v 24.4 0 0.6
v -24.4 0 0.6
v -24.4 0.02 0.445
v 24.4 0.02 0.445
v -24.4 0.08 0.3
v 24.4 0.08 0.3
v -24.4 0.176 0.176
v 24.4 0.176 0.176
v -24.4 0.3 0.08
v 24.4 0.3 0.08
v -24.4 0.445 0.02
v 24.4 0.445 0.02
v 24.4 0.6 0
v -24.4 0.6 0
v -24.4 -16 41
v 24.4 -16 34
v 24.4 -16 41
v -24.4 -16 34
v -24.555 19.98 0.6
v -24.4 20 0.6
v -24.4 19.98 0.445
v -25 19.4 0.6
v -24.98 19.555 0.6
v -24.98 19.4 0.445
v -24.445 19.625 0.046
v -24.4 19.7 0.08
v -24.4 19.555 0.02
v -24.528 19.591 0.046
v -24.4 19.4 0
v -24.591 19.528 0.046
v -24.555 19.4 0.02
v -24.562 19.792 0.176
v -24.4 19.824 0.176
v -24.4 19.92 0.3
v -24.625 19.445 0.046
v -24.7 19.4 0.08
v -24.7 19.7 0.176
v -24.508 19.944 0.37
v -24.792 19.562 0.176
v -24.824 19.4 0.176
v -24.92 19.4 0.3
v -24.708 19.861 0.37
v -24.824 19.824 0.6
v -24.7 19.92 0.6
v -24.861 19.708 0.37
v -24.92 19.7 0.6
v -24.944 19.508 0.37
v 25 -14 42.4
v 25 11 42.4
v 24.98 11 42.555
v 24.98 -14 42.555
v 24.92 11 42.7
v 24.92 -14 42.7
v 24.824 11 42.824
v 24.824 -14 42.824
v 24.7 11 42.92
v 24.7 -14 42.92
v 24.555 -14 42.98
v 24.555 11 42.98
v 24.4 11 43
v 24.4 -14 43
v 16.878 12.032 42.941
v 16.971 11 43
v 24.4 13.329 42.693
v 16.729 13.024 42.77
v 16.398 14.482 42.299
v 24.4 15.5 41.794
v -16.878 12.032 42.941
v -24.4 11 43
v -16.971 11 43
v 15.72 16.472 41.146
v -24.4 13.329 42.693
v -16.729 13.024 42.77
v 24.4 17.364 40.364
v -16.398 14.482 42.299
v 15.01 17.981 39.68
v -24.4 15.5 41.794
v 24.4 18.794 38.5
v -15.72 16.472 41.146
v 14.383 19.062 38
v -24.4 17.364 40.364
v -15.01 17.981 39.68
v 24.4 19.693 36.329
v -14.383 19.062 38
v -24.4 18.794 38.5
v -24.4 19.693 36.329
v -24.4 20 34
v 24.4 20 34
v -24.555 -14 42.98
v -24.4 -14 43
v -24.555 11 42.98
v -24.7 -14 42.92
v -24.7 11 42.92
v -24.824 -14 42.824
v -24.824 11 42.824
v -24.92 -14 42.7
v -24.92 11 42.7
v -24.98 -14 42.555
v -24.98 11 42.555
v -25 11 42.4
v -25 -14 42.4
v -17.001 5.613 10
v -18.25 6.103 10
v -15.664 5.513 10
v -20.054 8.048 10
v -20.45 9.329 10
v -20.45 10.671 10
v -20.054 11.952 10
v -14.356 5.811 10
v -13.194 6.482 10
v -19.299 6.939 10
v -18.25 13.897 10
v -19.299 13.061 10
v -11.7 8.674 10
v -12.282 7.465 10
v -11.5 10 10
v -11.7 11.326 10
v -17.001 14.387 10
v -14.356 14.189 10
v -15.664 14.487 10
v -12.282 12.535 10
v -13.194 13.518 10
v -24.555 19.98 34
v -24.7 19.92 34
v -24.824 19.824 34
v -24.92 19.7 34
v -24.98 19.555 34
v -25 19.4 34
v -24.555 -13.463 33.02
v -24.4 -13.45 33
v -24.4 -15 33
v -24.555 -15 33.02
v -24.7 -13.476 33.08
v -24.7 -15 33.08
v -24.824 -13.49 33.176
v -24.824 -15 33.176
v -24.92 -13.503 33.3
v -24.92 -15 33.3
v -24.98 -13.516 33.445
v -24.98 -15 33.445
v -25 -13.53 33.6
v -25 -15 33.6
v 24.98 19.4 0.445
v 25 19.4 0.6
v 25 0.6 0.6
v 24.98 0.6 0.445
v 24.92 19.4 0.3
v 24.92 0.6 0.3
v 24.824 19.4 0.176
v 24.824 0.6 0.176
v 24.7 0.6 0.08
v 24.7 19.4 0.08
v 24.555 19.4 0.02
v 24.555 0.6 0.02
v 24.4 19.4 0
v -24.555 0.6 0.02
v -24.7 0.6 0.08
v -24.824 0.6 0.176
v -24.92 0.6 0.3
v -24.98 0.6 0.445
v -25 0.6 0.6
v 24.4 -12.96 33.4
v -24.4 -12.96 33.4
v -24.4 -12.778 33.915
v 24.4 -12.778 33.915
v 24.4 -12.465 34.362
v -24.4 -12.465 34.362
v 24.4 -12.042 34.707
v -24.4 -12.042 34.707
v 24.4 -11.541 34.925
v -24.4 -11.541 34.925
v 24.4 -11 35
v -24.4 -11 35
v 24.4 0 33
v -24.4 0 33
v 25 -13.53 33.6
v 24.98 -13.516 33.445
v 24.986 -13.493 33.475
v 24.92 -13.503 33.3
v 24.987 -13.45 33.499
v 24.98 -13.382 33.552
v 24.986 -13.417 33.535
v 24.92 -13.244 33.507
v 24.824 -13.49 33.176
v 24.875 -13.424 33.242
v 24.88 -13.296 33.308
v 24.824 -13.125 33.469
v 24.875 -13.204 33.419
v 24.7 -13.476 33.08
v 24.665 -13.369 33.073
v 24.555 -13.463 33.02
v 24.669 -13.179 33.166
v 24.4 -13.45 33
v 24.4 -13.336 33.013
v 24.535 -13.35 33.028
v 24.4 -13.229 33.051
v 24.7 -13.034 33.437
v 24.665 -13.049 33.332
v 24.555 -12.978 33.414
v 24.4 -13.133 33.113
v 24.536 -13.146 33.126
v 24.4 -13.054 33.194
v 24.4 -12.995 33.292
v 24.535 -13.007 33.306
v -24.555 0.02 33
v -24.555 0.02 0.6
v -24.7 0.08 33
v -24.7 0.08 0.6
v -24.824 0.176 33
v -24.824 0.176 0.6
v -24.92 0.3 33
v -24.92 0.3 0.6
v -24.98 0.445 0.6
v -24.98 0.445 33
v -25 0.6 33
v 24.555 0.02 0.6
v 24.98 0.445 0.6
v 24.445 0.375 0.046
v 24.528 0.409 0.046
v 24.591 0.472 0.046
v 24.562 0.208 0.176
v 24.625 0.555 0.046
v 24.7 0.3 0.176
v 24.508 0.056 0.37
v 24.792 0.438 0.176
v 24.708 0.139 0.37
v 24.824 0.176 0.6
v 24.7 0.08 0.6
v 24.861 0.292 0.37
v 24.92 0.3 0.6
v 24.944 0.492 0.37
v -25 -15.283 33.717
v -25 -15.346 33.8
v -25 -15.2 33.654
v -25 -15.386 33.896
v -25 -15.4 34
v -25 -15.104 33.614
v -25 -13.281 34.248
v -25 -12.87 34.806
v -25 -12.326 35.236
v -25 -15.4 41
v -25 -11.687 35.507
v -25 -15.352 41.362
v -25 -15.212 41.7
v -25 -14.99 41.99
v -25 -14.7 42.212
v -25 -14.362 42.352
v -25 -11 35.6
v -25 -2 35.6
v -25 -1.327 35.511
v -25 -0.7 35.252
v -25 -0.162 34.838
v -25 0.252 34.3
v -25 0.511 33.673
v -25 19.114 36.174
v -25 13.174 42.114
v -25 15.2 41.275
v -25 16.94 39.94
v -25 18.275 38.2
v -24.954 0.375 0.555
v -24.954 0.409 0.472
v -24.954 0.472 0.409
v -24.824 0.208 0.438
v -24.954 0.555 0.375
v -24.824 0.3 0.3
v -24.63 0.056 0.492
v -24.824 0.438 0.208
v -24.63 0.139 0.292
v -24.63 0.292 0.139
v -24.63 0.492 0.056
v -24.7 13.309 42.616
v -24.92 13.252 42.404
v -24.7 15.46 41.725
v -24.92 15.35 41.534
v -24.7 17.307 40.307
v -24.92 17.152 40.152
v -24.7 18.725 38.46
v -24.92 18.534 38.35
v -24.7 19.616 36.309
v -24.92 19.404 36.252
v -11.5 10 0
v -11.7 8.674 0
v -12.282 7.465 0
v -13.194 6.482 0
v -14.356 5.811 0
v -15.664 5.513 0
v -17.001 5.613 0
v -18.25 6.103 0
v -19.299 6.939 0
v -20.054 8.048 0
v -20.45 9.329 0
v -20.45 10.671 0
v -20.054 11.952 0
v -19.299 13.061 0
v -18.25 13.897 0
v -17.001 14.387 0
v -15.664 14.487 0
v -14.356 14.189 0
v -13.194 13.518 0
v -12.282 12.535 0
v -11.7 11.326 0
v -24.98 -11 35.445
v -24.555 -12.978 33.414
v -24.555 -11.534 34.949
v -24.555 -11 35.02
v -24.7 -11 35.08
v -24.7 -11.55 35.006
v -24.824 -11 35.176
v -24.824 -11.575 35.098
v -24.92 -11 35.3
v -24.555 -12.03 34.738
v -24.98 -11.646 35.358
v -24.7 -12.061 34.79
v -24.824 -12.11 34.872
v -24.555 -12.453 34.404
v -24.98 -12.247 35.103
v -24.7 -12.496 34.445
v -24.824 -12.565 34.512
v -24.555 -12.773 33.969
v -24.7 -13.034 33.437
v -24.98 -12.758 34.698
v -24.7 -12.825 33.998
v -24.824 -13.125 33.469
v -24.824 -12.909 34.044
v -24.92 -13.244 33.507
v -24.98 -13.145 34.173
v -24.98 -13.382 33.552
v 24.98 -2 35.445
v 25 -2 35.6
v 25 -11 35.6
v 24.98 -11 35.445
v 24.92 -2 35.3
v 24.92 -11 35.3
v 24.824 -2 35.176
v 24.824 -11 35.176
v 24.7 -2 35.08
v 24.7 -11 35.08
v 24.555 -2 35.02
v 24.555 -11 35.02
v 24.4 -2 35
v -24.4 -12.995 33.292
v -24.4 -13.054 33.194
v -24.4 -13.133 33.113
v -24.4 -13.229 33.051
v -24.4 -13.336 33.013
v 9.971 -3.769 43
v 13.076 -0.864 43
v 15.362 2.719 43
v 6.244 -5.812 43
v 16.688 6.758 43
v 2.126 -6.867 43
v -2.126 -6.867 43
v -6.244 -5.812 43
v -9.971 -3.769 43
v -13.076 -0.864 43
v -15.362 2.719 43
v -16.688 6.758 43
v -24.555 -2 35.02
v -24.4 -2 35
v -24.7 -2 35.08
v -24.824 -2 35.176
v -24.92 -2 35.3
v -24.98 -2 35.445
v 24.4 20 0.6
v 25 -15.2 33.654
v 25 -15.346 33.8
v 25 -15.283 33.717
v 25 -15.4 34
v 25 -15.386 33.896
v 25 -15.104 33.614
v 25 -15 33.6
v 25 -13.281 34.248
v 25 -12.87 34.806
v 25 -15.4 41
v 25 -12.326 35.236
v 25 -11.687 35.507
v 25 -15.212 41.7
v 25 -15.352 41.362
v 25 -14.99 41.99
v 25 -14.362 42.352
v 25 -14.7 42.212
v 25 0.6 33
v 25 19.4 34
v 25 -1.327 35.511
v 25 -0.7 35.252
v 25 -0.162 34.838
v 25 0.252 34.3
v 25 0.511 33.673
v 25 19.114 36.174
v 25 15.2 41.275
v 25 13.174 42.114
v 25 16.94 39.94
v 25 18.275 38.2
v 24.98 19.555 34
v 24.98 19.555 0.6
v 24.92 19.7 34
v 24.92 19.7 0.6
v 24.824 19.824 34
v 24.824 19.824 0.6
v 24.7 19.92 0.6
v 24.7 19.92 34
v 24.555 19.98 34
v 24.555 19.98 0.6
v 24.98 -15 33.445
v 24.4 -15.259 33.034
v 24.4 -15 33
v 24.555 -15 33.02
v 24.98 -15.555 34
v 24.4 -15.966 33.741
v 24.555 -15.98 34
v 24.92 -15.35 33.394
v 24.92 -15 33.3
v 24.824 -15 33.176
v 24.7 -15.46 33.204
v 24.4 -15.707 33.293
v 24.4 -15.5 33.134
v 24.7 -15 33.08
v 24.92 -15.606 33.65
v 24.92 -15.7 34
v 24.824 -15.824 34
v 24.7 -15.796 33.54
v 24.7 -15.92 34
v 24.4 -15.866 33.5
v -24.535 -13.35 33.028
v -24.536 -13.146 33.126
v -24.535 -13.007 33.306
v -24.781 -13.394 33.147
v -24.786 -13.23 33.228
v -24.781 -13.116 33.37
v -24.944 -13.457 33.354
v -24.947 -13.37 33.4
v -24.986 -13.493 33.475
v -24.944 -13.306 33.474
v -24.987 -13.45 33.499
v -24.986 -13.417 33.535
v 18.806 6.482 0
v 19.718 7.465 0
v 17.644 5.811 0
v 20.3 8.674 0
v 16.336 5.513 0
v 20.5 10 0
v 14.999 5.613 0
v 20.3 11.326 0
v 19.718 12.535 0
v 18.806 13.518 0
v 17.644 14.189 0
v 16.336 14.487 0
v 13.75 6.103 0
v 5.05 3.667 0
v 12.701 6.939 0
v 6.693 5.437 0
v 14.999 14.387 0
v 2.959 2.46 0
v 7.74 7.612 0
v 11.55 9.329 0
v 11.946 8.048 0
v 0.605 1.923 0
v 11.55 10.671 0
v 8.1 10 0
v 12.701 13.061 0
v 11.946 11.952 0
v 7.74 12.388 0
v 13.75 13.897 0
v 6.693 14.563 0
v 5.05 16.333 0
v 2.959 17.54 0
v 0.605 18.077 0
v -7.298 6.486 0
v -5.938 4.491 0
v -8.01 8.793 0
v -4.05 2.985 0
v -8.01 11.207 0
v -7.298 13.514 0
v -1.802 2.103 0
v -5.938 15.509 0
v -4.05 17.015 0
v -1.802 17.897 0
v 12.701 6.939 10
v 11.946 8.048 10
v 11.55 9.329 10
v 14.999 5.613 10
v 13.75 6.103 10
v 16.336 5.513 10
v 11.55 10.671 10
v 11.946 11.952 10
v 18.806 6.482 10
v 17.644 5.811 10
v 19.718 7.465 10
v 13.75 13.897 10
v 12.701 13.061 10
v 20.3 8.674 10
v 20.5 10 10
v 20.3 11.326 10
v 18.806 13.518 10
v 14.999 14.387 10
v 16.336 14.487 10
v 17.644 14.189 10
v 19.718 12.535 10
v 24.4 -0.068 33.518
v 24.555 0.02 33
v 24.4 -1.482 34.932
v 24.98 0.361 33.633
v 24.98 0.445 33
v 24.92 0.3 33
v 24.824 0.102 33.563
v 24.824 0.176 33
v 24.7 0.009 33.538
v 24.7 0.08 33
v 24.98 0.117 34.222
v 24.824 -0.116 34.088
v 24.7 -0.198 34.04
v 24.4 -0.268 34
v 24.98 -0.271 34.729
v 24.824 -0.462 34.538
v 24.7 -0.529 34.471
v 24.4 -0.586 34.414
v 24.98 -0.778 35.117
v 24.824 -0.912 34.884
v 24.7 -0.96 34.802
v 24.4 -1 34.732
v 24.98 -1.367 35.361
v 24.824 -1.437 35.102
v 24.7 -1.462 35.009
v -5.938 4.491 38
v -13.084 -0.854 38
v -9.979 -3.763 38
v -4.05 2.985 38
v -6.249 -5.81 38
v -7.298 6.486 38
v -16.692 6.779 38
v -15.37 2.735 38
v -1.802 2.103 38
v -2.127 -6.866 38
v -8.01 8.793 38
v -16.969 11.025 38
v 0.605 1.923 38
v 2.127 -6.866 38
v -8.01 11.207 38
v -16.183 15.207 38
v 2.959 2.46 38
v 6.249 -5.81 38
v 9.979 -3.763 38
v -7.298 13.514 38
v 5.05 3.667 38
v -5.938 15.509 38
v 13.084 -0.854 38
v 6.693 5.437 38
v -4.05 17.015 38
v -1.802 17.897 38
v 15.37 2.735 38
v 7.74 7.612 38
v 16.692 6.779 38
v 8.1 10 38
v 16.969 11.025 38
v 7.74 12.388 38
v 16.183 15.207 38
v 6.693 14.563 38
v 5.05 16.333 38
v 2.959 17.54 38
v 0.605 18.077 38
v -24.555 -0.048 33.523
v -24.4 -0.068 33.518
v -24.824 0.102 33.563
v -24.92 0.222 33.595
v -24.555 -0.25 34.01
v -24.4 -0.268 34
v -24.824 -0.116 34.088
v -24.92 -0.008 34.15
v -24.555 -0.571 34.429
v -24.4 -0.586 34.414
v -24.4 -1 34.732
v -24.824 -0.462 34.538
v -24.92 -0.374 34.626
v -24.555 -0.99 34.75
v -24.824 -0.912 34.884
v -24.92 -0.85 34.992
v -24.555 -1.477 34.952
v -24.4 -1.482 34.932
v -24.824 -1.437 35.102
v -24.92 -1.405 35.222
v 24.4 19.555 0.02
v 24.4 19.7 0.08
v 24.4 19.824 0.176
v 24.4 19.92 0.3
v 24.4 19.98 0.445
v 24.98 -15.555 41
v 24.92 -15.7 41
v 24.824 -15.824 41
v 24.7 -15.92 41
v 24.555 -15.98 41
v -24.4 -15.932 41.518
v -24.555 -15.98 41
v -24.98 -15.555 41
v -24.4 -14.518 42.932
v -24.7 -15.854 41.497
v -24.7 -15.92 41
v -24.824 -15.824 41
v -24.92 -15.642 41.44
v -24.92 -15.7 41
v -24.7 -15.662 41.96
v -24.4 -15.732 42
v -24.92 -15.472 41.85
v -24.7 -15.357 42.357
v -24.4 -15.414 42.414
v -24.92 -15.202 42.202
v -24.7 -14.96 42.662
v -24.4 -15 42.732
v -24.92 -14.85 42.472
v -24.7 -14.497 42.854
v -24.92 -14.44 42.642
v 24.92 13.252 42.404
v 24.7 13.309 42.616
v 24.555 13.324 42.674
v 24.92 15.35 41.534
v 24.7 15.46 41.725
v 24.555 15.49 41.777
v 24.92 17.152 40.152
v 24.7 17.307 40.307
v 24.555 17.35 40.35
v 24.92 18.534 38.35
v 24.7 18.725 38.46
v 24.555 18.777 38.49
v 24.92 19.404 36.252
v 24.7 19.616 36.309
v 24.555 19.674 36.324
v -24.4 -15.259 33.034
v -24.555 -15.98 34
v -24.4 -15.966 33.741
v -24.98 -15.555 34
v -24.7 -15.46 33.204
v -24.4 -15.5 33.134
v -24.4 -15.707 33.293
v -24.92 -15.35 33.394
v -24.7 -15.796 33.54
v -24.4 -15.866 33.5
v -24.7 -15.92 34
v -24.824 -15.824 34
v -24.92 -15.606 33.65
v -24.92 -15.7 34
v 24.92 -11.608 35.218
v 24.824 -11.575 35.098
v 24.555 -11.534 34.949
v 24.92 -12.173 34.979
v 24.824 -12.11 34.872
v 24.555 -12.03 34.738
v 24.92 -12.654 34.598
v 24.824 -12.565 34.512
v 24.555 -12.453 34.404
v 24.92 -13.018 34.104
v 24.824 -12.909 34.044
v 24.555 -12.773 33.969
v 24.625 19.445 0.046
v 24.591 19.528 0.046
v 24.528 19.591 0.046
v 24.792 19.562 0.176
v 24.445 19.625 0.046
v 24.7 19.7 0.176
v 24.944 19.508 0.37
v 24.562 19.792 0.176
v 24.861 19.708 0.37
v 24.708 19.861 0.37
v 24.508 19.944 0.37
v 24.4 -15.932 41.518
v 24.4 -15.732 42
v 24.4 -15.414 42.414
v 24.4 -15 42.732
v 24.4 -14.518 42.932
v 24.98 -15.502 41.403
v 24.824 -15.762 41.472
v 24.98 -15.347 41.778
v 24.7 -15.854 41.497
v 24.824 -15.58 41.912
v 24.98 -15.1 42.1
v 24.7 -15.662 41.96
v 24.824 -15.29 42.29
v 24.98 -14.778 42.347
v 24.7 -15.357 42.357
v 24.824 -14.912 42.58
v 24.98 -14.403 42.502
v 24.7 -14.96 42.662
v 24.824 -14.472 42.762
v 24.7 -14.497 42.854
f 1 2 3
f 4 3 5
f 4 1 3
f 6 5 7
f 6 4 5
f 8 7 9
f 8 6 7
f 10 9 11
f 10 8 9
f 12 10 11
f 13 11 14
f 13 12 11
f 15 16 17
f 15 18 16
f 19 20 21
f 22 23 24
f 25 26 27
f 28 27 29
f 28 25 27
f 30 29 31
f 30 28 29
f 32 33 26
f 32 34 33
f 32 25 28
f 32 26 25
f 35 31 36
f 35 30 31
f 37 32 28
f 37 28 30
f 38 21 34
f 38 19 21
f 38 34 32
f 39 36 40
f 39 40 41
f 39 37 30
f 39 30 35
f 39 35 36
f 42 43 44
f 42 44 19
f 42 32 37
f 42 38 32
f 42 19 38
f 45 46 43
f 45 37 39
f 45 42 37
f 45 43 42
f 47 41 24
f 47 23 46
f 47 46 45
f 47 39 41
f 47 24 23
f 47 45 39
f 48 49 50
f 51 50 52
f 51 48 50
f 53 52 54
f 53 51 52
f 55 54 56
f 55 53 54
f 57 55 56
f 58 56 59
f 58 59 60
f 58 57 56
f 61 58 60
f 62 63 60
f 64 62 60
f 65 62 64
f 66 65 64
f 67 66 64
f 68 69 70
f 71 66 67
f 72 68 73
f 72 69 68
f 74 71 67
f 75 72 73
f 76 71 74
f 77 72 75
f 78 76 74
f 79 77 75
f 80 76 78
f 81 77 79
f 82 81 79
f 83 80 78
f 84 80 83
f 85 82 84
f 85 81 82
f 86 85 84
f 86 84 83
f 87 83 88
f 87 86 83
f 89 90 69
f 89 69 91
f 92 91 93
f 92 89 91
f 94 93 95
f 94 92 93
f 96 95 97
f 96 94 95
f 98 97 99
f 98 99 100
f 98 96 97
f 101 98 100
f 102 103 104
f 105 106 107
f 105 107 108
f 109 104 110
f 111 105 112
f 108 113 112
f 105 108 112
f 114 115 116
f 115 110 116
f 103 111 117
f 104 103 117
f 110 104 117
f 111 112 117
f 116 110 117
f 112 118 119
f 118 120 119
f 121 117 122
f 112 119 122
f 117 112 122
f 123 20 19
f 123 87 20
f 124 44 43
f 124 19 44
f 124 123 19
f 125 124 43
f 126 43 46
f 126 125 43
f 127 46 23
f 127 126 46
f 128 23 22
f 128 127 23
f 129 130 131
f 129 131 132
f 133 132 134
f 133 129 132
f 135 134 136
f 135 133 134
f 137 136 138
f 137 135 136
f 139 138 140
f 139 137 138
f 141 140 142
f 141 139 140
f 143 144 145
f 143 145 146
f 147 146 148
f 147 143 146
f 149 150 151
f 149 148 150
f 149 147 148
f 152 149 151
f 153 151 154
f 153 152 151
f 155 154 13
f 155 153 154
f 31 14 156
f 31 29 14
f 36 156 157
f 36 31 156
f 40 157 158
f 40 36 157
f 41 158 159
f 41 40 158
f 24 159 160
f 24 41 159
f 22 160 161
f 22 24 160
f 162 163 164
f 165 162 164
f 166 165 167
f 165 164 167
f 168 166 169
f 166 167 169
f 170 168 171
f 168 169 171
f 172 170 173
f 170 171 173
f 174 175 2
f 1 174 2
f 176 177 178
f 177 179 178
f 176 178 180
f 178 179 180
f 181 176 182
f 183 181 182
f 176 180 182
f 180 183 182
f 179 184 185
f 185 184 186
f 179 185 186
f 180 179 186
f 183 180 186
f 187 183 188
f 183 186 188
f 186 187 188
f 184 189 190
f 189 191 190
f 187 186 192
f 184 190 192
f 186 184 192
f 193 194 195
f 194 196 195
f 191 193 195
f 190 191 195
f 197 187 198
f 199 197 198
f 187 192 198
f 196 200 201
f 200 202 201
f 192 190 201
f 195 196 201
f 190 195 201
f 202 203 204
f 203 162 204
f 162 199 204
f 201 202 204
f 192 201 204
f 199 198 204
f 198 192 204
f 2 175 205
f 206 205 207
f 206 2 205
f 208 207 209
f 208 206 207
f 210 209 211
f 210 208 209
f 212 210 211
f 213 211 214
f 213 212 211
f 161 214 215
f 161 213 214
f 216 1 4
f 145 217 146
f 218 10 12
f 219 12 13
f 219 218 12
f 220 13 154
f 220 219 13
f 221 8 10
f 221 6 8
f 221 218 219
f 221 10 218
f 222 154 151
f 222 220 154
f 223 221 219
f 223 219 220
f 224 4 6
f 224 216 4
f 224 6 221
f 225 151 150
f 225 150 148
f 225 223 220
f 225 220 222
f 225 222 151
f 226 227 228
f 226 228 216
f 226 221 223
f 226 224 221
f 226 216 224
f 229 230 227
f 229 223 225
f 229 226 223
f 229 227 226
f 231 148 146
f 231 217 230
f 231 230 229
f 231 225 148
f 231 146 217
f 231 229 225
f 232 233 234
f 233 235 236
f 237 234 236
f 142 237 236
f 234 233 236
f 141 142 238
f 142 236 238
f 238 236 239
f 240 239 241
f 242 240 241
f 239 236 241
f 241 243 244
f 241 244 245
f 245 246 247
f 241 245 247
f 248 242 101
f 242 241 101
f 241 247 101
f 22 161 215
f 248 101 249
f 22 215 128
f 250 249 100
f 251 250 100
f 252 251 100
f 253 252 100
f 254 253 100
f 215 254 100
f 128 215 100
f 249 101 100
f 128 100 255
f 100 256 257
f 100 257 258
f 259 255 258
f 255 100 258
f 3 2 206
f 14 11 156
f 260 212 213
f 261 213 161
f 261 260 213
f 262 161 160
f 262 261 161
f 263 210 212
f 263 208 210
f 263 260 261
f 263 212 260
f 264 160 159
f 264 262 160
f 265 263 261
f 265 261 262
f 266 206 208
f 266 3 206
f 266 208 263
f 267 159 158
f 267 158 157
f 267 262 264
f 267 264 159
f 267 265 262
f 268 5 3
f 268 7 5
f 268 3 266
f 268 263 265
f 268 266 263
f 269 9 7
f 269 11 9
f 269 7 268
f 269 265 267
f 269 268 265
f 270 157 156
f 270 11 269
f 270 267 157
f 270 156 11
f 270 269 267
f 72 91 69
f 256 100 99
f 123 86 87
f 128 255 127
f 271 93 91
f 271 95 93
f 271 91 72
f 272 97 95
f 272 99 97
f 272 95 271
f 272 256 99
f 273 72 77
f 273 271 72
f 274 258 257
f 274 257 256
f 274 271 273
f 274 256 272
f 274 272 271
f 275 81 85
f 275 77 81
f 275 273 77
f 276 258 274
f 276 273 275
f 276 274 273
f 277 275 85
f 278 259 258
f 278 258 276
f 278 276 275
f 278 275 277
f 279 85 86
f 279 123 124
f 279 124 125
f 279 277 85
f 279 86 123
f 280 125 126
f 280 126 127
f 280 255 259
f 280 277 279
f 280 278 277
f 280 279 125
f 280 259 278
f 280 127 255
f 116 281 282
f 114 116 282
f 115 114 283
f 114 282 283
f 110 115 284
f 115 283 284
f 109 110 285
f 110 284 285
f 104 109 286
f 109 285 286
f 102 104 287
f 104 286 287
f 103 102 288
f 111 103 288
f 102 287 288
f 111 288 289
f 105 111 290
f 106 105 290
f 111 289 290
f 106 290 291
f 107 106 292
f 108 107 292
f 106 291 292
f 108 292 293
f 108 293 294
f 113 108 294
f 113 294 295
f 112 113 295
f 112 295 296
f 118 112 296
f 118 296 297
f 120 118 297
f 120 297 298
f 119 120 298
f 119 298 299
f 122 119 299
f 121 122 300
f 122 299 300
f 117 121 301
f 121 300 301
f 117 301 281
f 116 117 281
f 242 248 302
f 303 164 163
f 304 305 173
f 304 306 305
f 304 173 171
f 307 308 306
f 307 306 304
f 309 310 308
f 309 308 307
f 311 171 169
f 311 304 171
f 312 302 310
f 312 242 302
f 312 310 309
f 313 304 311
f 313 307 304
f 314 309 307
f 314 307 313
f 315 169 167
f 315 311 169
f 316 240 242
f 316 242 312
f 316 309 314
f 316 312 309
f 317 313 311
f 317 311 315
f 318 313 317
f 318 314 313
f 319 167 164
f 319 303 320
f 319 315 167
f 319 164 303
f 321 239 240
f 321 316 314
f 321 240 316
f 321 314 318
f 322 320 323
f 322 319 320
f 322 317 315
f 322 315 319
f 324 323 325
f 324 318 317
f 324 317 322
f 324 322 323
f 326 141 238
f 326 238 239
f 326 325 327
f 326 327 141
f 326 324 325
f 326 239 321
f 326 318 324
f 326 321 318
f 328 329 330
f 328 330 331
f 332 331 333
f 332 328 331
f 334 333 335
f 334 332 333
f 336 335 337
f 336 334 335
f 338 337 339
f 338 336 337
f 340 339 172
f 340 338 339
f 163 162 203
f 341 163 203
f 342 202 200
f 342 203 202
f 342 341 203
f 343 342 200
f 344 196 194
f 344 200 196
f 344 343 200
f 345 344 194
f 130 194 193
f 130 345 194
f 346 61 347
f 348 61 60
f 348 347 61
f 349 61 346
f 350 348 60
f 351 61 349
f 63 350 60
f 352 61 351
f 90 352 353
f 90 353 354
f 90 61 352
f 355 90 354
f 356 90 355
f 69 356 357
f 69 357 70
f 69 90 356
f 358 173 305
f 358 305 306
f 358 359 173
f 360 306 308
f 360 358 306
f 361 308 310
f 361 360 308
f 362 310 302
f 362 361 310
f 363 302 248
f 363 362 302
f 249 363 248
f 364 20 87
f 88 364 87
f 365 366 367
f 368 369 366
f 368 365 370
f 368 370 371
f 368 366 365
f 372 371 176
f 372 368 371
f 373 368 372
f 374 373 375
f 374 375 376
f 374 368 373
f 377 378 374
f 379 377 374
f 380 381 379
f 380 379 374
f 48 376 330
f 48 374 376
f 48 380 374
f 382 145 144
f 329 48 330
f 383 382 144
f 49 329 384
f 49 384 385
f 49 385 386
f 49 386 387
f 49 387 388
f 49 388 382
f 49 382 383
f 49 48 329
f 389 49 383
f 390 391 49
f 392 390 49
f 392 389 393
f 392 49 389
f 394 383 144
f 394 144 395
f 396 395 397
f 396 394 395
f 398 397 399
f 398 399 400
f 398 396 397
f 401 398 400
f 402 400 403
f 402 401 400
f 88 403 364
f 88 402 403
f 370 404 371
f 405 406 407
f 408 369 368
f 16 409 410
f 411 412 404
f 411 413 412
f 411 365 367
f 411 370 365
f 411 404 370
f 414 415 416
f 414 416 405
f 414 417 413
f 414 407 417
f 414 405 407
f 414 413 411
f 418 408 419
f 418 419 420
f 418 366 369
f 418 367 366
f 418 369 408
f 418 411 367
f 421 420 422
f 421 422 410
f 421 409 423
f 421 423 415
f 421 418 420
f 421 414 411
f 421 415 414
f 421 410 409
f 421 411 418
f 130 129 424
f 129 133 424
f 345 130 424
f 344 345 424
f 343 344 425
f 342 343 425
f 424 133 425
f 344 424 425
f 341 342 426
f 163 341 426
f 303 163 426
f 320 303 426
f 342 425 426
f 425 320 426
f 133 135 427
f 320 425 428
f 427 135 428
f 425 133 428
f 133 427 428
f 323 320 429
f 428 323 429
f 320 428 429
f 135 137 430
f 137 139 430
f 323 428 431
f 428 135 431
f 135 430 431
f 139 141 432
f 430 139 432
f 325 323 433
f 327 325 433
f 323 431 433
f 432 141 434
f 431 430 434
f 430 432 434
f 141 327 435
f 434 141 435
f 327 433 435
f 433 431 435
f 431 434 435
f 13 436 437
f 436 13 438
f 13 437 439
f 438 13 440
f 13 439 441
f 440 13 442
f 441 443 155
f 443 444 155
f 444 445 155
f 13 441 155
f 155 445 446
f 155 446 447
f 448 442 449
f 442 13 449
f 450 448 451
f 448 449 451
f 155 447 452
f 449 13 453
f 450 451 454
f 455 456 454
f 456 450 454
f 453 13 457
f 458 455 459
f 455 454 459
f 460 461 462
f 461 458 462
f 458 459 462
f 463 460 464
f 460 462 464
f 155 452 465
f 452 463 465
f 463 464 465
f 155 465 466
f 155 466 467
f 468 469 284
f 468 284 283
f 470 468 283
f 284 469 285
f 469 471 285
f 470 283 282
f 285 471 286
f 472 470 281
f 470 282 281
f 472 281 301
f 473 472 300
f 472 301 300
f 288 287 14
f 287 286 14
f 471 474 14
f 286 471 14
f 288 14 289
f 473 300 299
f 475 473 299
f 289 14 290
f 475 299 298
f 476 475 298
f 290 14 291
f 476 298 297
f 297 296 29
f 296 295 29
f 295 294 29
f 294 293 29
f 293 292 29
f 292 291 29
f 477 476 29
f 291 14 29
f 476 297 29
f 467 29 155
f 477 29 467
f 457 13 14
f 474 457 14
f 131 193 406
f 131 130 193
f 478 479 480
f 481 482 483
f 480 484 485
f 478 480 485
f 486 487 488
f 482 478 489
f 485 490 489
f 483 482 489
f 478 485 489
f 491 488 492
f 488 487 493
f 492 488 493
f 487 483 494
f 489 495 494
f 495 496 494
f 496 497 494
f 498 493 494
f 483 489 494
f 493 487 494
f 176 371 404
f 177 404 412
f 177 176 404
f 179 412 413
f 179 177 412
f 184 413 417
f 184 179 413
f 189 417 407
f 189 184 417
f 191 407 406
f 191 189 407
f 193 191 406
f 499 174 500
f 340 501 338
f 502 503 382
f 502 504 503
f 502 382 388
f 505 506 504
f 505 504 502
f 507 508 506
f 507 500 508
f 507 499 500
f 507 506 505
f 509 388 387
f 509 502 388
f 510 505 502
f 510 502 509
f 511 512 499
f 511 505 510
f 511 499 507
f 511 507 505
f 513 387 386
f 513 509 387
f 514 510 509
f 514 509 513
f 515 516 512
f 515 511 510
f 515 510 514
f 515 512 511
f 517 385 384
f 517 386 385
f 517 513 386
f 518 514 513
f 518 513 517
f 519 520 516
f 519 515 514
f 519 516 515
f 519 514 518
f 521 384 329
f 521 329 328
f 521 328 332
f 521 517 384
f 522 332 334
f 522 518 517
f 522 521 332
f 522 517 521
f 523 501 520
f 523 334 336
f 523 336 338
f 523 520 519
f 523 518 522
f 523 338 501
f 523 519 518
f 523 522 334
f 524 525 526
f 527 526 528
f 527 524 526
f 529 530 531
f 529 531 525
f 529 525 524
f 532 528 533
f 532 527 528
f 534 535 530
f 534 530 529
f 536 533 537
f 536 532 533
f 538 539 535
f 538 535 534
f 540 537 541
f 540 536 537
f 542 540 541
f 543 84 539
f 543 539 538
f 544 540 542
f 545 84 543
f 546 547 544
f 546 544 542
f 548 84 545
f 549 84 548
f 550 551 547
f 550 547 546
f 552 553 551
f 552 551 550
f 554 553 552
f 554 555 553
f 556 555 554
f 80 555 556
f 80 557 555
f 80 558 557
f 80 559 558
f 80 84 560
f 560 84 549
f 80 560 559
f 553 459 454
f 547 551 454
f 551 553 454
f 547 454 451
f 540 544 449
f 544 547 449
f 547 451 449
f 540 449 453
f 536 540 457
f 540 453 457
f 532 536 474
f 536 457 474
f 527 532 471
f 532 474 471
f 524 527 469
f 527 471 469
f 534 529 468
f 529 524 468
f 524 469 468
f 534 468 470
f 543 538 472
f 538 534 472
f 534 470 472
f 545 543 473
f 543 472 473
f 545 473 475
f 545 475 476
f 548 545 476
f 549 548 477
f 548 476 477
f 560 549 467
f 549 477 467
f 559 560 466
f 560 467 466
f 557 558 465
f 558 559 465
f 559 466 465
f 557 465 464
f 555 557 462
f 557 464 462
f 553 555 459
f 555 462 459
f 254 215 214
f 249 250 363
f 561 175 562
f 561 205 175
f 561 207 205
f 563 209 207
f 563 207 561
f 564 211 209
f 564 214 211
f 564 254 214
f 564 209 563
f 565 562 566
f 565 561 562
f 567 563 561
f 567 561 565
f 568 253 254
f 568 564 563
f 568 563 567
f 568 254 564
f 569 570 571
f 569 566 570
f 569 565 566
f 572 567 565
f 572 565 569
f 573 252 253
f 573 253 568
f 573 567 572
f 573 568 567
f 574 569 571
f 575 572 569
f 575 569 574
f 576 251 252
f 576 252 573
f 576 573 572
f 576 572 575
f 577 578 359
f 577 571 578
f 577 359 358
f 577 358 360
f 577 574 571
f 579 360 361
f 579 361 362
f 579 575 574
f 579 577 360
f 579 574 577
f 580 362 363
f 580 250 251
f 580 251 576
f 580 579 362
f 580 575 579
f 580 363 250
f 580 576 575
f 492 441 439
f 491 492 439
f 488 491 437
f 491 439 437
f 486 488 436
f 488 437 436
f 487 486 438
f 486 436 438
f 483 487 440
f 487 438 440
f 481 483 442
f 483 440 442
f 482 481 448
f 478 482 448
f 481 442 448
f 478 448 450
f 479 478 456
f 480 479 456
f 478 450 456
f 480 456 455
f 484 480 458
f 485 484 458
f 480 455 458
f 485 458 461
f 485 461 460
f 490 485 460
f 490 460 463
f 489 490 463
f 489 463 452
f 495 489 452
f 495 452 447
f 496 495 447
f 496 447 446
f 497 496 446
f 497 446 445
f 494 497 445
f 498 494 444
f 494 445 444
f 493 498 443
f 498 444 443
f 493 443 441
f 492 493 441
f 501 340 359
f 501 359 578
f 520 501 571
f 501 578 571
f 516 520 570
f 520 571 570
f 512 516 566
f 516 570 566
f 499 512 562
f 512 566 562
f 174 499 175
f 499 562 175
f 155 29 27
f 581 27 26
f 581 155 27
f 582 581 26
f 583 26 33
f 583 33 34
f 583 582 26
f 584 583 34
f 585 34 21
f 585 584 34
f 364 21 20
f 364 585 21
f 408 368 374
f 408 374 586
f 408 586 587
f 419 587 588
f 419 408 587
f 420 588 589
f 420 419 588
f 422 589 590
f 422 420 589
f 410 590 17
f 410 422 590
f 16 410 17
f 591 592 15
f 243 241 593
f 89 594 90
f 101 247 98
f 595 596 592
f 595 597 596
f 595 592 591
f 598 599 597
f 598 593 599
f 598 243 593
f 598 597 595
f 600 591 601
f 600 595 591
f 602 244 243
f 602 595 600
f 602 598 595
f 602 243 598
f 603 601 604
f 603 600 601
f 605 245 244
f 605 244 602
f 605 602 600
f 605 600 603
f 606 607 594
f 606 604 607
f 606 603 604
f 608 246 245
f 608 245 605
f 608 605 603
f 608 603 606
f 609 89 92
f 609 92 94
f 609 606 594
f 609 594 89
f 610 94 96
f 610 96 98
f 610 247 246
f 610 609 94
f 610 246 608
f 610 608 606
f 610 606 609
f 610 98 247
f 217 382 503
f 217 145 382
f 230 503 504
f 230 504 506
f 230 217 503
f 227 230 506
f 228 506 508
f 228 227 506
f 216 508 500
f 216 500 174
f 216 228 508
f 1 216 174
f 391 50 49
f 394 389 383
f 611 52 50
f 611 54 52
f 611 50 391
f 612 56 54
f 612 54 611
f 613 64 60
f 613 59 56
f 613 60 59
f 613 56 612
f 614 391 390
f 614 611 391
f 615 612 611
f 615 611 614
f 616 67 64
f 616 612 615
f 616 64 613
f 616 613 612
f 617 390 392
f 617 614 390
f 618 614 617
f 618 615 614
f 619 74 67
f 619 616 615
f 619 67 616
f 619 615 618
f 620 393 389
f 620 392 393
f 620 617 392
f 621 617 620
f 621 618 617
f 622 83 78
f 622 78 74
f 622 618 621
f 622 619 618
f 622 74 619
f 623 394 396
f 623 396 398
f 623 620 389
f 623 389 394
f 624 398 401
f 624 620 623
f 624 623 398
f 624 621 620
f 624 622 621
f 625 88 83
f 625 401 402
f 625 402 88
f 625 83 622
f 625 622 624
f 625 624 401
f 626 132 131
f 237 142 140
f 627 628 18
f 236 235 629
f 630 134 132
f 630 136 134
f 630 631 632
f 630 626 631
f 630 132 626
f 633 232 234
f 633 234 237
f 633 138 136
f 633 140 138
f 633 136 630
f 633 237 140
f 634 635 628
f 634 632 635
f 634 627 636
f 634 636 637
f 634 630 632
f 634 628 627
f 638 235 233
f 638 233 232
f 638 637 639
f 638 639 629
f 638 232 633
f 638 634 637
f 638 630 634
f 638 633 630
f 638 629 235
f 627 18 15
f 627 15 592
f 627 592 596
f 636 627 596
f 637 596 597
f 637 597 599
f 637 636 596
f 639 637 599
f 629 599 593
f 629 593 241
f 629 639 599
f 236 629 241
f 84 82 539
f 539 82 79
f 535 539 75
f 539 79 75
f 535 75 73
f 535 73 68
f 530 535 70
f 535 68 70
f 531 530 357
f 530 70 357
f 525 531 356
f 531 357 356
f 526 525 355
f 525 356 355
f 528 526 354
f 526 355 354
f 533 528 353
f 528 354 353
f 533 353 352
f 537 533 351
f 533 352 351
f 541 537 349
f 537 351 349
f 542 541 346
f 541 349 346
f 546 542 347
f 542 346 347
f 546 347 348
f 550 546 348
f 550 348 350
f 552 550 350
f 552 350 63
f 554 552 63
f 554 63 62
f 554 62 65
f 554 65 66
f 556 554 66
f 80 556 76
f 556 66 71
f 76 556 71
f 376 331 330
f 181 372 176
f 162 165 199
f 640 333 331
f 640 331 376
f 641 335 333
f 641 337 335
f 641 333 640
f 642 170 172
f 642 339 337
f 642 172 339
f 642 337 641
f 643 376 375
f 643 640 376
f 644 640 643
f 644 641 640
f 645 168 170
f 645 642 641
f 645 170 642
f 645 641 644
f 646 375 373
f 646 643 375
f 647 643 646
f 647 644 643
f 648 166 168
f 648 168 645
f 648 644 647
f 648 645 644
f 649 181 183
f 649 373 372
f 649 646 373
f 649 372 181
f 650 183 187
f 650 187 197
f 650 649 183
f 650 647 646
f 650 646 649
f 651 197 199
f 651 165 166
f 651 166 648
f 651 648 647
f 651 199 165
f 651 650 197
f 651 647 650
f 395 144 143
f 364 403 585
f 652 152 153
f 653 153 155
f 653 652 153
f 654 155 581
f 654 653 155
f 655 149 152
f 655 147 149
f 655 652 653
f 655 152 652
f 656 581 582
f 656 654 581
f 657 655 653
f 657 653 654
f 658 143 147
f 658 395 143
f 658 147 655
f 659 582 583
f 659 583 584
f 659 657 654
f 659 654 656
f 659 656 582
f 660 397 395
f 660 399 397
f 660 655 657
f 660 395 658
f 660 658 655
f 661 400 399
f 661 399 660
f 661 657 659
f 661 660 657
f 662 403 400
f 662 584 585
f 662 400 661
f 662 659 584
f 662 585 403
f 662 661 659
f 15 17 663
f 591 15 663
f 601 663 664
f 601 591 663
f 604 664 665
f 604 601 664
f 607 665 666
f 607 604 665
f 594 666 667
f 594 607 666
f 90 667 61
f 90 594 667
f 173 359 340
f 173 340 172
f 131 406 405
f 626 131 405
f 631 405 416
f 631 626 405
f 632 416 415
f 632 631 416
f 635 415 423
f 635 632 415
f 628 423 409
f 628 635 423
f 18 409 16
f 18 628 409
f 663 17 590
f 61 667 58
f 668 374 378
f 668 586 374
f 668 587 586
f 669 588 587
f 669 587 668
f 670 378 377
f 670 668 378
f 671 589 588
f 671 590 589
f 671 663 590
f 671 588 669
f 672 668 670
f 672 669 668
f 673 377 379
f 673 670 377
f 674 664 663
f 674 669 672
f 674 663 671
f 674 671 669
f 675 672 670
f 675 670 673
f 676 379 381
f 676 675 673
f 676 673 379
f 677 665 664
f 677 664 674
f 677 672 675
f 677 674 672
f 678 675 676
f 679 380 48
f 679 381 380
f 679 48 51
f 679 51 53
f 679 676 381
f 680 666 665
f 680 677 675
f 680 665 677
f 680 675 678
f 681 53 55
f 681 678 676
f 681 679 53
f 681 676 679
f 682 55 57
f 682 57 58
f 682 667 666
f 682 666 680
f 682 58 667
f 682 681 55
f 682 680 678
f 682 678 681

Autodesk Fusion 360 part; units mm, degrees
sketch "PhoneSupportTop" plane through (0, 0, 0) normal (1, 0, 0) x (0, 1, 0)
  line L0 (0, 0) -> (20, 0)
  line L1 (0, 33) -> (0, 0)
  line L2 (-2, 35) -> (-11, 35)
  line L3 (-13.4495, 33) -> (-15, 33)
  line L4 (-16, 34) -> (-16, 41)
  arc A0 (-11, 35) -> (-12.9596, 33.4) centre (-11, 33) ccw
  arc A1 (0, 33) -> (-2, 35) centre (-2, 33) ccw
  line L5 (-14, 43) -> (11, 43)
  line L6 (20, 0) -> (20, 34)
  arc A2 (20, 34) -> (11, 43) centre (11, 34) ccw
  arc A3 (-14, 43) -> (-16, 41) centre (-14, 41) ccw
  arc A4 (-13.4495, 33) -> (-12.9596, 33.4) centre (-13.4495, 33.5) ccw
  arc A5 (-16, 34) -> (-15, 33) centre (-15, 34) ccw
  point P0 (-13, 33)
  point P1 (-16, 33)
  point P2 (-16, 43)
  dimension "d3" = 20
  dimension "d7" = 4
  dimension "d8" = 3
  dimension "d10" = 2
  dimension "d11" = 9
  dimension "d13" = 34
  dimension "d14" = 27
  dimension "d15" = 10
  dimension "d16" = 9
  dimension "d17" = 2
  dimension "d18" = 0.5
  dimension "d19" = 1
extrude "Extrude1" add sketch "PhoneSupportTop" along normal mid plane 50
sketch "Sketch2" plane through (0, 0, 0) normal (0, 0, 1) x (1, 0, 0)
  line L0 (25, 20) -> (-25, 20) construction
  line L1 (-25, 20) -> (-25, 0) construction
  line L2 (-25, 0) -> (25, 0) construction
  line L3 (25, 0) -> (25, 20) construction
  line L4 (25, 10) -> (-25, 10) construction
  circle A0 centre (0, 10) radius 8.1
  circle A1 centre (16, 10) radius 4.5
  circle A2 centre (-16, 10) radius 4.5
  circle A3 centre (0, 10) radius 17
  dimension "d23" = 16.2
  dimension "d24" = 9
  dimension "d25" = 9
  dimension "d27" = 9
  dimension "d28" = 9
  dimension "d40" = 34
extrude "Extrude2" cut sketch "Sketch2" along normal blind 10 contours A1 A3 | A1 A3 | A2 A3 | A2 A3
extrude "Extrude3" cut sketch "Sketch2" along normal through all contours A0
extrude "Extrude4" cut sketch "Sketch2" against normal blind 5 from surface at 43 contours A1 A2 A3
fillet "Fillet1" radius 0.6 28 edges at (25, 20, 17) (25, 17.364, 40.364) (25, -1.5, 43) (25, -15.4142, 42.4142) (25, -16, 37.5) (25, -15.7071, 33.2929) (25, -14.2247, 33) (25, -13.1333, 33.1127) (25, -12.2649, 34.5492) (25, -6.5, 35) (25, -0.5858, 34.4142) (25, 0, 16.5) (25, 10, 0) (0, 0, 0) (-25, 0, 16.5) (-25, -0.5858, 34.4142) (-25, -6.5, 35) (-25, -12.2649, 34.5492) (-25, -13.1333, 33.1127) (-25, -14.2247, 33) (-25, -15.7071, 33.2929) (-25, -16, 37.5) (-25, -15.4142, 42.4142) (-25, -1.5, 43) (-25, 17.364, 40.364) (-25, 20, 17) (-25, 10, 0) (0, 20, 0)
extrude "Extrude5" cut sketch "Sketch2" against normal blind 5 from surface at 43 contours A1 A3 | A1 A2 A3 | A2 A3 picked at (15.2408, 11.0328) picked at (-15.34, 11.5418)
equation "PhoneSupportThickness = 50 mm"
equation "d21 = PhoneSupportThickness / 2"
equation "d23 = 16 mm + 2 * Tolerance"
equation "Tolerance = 0.1 mm"
